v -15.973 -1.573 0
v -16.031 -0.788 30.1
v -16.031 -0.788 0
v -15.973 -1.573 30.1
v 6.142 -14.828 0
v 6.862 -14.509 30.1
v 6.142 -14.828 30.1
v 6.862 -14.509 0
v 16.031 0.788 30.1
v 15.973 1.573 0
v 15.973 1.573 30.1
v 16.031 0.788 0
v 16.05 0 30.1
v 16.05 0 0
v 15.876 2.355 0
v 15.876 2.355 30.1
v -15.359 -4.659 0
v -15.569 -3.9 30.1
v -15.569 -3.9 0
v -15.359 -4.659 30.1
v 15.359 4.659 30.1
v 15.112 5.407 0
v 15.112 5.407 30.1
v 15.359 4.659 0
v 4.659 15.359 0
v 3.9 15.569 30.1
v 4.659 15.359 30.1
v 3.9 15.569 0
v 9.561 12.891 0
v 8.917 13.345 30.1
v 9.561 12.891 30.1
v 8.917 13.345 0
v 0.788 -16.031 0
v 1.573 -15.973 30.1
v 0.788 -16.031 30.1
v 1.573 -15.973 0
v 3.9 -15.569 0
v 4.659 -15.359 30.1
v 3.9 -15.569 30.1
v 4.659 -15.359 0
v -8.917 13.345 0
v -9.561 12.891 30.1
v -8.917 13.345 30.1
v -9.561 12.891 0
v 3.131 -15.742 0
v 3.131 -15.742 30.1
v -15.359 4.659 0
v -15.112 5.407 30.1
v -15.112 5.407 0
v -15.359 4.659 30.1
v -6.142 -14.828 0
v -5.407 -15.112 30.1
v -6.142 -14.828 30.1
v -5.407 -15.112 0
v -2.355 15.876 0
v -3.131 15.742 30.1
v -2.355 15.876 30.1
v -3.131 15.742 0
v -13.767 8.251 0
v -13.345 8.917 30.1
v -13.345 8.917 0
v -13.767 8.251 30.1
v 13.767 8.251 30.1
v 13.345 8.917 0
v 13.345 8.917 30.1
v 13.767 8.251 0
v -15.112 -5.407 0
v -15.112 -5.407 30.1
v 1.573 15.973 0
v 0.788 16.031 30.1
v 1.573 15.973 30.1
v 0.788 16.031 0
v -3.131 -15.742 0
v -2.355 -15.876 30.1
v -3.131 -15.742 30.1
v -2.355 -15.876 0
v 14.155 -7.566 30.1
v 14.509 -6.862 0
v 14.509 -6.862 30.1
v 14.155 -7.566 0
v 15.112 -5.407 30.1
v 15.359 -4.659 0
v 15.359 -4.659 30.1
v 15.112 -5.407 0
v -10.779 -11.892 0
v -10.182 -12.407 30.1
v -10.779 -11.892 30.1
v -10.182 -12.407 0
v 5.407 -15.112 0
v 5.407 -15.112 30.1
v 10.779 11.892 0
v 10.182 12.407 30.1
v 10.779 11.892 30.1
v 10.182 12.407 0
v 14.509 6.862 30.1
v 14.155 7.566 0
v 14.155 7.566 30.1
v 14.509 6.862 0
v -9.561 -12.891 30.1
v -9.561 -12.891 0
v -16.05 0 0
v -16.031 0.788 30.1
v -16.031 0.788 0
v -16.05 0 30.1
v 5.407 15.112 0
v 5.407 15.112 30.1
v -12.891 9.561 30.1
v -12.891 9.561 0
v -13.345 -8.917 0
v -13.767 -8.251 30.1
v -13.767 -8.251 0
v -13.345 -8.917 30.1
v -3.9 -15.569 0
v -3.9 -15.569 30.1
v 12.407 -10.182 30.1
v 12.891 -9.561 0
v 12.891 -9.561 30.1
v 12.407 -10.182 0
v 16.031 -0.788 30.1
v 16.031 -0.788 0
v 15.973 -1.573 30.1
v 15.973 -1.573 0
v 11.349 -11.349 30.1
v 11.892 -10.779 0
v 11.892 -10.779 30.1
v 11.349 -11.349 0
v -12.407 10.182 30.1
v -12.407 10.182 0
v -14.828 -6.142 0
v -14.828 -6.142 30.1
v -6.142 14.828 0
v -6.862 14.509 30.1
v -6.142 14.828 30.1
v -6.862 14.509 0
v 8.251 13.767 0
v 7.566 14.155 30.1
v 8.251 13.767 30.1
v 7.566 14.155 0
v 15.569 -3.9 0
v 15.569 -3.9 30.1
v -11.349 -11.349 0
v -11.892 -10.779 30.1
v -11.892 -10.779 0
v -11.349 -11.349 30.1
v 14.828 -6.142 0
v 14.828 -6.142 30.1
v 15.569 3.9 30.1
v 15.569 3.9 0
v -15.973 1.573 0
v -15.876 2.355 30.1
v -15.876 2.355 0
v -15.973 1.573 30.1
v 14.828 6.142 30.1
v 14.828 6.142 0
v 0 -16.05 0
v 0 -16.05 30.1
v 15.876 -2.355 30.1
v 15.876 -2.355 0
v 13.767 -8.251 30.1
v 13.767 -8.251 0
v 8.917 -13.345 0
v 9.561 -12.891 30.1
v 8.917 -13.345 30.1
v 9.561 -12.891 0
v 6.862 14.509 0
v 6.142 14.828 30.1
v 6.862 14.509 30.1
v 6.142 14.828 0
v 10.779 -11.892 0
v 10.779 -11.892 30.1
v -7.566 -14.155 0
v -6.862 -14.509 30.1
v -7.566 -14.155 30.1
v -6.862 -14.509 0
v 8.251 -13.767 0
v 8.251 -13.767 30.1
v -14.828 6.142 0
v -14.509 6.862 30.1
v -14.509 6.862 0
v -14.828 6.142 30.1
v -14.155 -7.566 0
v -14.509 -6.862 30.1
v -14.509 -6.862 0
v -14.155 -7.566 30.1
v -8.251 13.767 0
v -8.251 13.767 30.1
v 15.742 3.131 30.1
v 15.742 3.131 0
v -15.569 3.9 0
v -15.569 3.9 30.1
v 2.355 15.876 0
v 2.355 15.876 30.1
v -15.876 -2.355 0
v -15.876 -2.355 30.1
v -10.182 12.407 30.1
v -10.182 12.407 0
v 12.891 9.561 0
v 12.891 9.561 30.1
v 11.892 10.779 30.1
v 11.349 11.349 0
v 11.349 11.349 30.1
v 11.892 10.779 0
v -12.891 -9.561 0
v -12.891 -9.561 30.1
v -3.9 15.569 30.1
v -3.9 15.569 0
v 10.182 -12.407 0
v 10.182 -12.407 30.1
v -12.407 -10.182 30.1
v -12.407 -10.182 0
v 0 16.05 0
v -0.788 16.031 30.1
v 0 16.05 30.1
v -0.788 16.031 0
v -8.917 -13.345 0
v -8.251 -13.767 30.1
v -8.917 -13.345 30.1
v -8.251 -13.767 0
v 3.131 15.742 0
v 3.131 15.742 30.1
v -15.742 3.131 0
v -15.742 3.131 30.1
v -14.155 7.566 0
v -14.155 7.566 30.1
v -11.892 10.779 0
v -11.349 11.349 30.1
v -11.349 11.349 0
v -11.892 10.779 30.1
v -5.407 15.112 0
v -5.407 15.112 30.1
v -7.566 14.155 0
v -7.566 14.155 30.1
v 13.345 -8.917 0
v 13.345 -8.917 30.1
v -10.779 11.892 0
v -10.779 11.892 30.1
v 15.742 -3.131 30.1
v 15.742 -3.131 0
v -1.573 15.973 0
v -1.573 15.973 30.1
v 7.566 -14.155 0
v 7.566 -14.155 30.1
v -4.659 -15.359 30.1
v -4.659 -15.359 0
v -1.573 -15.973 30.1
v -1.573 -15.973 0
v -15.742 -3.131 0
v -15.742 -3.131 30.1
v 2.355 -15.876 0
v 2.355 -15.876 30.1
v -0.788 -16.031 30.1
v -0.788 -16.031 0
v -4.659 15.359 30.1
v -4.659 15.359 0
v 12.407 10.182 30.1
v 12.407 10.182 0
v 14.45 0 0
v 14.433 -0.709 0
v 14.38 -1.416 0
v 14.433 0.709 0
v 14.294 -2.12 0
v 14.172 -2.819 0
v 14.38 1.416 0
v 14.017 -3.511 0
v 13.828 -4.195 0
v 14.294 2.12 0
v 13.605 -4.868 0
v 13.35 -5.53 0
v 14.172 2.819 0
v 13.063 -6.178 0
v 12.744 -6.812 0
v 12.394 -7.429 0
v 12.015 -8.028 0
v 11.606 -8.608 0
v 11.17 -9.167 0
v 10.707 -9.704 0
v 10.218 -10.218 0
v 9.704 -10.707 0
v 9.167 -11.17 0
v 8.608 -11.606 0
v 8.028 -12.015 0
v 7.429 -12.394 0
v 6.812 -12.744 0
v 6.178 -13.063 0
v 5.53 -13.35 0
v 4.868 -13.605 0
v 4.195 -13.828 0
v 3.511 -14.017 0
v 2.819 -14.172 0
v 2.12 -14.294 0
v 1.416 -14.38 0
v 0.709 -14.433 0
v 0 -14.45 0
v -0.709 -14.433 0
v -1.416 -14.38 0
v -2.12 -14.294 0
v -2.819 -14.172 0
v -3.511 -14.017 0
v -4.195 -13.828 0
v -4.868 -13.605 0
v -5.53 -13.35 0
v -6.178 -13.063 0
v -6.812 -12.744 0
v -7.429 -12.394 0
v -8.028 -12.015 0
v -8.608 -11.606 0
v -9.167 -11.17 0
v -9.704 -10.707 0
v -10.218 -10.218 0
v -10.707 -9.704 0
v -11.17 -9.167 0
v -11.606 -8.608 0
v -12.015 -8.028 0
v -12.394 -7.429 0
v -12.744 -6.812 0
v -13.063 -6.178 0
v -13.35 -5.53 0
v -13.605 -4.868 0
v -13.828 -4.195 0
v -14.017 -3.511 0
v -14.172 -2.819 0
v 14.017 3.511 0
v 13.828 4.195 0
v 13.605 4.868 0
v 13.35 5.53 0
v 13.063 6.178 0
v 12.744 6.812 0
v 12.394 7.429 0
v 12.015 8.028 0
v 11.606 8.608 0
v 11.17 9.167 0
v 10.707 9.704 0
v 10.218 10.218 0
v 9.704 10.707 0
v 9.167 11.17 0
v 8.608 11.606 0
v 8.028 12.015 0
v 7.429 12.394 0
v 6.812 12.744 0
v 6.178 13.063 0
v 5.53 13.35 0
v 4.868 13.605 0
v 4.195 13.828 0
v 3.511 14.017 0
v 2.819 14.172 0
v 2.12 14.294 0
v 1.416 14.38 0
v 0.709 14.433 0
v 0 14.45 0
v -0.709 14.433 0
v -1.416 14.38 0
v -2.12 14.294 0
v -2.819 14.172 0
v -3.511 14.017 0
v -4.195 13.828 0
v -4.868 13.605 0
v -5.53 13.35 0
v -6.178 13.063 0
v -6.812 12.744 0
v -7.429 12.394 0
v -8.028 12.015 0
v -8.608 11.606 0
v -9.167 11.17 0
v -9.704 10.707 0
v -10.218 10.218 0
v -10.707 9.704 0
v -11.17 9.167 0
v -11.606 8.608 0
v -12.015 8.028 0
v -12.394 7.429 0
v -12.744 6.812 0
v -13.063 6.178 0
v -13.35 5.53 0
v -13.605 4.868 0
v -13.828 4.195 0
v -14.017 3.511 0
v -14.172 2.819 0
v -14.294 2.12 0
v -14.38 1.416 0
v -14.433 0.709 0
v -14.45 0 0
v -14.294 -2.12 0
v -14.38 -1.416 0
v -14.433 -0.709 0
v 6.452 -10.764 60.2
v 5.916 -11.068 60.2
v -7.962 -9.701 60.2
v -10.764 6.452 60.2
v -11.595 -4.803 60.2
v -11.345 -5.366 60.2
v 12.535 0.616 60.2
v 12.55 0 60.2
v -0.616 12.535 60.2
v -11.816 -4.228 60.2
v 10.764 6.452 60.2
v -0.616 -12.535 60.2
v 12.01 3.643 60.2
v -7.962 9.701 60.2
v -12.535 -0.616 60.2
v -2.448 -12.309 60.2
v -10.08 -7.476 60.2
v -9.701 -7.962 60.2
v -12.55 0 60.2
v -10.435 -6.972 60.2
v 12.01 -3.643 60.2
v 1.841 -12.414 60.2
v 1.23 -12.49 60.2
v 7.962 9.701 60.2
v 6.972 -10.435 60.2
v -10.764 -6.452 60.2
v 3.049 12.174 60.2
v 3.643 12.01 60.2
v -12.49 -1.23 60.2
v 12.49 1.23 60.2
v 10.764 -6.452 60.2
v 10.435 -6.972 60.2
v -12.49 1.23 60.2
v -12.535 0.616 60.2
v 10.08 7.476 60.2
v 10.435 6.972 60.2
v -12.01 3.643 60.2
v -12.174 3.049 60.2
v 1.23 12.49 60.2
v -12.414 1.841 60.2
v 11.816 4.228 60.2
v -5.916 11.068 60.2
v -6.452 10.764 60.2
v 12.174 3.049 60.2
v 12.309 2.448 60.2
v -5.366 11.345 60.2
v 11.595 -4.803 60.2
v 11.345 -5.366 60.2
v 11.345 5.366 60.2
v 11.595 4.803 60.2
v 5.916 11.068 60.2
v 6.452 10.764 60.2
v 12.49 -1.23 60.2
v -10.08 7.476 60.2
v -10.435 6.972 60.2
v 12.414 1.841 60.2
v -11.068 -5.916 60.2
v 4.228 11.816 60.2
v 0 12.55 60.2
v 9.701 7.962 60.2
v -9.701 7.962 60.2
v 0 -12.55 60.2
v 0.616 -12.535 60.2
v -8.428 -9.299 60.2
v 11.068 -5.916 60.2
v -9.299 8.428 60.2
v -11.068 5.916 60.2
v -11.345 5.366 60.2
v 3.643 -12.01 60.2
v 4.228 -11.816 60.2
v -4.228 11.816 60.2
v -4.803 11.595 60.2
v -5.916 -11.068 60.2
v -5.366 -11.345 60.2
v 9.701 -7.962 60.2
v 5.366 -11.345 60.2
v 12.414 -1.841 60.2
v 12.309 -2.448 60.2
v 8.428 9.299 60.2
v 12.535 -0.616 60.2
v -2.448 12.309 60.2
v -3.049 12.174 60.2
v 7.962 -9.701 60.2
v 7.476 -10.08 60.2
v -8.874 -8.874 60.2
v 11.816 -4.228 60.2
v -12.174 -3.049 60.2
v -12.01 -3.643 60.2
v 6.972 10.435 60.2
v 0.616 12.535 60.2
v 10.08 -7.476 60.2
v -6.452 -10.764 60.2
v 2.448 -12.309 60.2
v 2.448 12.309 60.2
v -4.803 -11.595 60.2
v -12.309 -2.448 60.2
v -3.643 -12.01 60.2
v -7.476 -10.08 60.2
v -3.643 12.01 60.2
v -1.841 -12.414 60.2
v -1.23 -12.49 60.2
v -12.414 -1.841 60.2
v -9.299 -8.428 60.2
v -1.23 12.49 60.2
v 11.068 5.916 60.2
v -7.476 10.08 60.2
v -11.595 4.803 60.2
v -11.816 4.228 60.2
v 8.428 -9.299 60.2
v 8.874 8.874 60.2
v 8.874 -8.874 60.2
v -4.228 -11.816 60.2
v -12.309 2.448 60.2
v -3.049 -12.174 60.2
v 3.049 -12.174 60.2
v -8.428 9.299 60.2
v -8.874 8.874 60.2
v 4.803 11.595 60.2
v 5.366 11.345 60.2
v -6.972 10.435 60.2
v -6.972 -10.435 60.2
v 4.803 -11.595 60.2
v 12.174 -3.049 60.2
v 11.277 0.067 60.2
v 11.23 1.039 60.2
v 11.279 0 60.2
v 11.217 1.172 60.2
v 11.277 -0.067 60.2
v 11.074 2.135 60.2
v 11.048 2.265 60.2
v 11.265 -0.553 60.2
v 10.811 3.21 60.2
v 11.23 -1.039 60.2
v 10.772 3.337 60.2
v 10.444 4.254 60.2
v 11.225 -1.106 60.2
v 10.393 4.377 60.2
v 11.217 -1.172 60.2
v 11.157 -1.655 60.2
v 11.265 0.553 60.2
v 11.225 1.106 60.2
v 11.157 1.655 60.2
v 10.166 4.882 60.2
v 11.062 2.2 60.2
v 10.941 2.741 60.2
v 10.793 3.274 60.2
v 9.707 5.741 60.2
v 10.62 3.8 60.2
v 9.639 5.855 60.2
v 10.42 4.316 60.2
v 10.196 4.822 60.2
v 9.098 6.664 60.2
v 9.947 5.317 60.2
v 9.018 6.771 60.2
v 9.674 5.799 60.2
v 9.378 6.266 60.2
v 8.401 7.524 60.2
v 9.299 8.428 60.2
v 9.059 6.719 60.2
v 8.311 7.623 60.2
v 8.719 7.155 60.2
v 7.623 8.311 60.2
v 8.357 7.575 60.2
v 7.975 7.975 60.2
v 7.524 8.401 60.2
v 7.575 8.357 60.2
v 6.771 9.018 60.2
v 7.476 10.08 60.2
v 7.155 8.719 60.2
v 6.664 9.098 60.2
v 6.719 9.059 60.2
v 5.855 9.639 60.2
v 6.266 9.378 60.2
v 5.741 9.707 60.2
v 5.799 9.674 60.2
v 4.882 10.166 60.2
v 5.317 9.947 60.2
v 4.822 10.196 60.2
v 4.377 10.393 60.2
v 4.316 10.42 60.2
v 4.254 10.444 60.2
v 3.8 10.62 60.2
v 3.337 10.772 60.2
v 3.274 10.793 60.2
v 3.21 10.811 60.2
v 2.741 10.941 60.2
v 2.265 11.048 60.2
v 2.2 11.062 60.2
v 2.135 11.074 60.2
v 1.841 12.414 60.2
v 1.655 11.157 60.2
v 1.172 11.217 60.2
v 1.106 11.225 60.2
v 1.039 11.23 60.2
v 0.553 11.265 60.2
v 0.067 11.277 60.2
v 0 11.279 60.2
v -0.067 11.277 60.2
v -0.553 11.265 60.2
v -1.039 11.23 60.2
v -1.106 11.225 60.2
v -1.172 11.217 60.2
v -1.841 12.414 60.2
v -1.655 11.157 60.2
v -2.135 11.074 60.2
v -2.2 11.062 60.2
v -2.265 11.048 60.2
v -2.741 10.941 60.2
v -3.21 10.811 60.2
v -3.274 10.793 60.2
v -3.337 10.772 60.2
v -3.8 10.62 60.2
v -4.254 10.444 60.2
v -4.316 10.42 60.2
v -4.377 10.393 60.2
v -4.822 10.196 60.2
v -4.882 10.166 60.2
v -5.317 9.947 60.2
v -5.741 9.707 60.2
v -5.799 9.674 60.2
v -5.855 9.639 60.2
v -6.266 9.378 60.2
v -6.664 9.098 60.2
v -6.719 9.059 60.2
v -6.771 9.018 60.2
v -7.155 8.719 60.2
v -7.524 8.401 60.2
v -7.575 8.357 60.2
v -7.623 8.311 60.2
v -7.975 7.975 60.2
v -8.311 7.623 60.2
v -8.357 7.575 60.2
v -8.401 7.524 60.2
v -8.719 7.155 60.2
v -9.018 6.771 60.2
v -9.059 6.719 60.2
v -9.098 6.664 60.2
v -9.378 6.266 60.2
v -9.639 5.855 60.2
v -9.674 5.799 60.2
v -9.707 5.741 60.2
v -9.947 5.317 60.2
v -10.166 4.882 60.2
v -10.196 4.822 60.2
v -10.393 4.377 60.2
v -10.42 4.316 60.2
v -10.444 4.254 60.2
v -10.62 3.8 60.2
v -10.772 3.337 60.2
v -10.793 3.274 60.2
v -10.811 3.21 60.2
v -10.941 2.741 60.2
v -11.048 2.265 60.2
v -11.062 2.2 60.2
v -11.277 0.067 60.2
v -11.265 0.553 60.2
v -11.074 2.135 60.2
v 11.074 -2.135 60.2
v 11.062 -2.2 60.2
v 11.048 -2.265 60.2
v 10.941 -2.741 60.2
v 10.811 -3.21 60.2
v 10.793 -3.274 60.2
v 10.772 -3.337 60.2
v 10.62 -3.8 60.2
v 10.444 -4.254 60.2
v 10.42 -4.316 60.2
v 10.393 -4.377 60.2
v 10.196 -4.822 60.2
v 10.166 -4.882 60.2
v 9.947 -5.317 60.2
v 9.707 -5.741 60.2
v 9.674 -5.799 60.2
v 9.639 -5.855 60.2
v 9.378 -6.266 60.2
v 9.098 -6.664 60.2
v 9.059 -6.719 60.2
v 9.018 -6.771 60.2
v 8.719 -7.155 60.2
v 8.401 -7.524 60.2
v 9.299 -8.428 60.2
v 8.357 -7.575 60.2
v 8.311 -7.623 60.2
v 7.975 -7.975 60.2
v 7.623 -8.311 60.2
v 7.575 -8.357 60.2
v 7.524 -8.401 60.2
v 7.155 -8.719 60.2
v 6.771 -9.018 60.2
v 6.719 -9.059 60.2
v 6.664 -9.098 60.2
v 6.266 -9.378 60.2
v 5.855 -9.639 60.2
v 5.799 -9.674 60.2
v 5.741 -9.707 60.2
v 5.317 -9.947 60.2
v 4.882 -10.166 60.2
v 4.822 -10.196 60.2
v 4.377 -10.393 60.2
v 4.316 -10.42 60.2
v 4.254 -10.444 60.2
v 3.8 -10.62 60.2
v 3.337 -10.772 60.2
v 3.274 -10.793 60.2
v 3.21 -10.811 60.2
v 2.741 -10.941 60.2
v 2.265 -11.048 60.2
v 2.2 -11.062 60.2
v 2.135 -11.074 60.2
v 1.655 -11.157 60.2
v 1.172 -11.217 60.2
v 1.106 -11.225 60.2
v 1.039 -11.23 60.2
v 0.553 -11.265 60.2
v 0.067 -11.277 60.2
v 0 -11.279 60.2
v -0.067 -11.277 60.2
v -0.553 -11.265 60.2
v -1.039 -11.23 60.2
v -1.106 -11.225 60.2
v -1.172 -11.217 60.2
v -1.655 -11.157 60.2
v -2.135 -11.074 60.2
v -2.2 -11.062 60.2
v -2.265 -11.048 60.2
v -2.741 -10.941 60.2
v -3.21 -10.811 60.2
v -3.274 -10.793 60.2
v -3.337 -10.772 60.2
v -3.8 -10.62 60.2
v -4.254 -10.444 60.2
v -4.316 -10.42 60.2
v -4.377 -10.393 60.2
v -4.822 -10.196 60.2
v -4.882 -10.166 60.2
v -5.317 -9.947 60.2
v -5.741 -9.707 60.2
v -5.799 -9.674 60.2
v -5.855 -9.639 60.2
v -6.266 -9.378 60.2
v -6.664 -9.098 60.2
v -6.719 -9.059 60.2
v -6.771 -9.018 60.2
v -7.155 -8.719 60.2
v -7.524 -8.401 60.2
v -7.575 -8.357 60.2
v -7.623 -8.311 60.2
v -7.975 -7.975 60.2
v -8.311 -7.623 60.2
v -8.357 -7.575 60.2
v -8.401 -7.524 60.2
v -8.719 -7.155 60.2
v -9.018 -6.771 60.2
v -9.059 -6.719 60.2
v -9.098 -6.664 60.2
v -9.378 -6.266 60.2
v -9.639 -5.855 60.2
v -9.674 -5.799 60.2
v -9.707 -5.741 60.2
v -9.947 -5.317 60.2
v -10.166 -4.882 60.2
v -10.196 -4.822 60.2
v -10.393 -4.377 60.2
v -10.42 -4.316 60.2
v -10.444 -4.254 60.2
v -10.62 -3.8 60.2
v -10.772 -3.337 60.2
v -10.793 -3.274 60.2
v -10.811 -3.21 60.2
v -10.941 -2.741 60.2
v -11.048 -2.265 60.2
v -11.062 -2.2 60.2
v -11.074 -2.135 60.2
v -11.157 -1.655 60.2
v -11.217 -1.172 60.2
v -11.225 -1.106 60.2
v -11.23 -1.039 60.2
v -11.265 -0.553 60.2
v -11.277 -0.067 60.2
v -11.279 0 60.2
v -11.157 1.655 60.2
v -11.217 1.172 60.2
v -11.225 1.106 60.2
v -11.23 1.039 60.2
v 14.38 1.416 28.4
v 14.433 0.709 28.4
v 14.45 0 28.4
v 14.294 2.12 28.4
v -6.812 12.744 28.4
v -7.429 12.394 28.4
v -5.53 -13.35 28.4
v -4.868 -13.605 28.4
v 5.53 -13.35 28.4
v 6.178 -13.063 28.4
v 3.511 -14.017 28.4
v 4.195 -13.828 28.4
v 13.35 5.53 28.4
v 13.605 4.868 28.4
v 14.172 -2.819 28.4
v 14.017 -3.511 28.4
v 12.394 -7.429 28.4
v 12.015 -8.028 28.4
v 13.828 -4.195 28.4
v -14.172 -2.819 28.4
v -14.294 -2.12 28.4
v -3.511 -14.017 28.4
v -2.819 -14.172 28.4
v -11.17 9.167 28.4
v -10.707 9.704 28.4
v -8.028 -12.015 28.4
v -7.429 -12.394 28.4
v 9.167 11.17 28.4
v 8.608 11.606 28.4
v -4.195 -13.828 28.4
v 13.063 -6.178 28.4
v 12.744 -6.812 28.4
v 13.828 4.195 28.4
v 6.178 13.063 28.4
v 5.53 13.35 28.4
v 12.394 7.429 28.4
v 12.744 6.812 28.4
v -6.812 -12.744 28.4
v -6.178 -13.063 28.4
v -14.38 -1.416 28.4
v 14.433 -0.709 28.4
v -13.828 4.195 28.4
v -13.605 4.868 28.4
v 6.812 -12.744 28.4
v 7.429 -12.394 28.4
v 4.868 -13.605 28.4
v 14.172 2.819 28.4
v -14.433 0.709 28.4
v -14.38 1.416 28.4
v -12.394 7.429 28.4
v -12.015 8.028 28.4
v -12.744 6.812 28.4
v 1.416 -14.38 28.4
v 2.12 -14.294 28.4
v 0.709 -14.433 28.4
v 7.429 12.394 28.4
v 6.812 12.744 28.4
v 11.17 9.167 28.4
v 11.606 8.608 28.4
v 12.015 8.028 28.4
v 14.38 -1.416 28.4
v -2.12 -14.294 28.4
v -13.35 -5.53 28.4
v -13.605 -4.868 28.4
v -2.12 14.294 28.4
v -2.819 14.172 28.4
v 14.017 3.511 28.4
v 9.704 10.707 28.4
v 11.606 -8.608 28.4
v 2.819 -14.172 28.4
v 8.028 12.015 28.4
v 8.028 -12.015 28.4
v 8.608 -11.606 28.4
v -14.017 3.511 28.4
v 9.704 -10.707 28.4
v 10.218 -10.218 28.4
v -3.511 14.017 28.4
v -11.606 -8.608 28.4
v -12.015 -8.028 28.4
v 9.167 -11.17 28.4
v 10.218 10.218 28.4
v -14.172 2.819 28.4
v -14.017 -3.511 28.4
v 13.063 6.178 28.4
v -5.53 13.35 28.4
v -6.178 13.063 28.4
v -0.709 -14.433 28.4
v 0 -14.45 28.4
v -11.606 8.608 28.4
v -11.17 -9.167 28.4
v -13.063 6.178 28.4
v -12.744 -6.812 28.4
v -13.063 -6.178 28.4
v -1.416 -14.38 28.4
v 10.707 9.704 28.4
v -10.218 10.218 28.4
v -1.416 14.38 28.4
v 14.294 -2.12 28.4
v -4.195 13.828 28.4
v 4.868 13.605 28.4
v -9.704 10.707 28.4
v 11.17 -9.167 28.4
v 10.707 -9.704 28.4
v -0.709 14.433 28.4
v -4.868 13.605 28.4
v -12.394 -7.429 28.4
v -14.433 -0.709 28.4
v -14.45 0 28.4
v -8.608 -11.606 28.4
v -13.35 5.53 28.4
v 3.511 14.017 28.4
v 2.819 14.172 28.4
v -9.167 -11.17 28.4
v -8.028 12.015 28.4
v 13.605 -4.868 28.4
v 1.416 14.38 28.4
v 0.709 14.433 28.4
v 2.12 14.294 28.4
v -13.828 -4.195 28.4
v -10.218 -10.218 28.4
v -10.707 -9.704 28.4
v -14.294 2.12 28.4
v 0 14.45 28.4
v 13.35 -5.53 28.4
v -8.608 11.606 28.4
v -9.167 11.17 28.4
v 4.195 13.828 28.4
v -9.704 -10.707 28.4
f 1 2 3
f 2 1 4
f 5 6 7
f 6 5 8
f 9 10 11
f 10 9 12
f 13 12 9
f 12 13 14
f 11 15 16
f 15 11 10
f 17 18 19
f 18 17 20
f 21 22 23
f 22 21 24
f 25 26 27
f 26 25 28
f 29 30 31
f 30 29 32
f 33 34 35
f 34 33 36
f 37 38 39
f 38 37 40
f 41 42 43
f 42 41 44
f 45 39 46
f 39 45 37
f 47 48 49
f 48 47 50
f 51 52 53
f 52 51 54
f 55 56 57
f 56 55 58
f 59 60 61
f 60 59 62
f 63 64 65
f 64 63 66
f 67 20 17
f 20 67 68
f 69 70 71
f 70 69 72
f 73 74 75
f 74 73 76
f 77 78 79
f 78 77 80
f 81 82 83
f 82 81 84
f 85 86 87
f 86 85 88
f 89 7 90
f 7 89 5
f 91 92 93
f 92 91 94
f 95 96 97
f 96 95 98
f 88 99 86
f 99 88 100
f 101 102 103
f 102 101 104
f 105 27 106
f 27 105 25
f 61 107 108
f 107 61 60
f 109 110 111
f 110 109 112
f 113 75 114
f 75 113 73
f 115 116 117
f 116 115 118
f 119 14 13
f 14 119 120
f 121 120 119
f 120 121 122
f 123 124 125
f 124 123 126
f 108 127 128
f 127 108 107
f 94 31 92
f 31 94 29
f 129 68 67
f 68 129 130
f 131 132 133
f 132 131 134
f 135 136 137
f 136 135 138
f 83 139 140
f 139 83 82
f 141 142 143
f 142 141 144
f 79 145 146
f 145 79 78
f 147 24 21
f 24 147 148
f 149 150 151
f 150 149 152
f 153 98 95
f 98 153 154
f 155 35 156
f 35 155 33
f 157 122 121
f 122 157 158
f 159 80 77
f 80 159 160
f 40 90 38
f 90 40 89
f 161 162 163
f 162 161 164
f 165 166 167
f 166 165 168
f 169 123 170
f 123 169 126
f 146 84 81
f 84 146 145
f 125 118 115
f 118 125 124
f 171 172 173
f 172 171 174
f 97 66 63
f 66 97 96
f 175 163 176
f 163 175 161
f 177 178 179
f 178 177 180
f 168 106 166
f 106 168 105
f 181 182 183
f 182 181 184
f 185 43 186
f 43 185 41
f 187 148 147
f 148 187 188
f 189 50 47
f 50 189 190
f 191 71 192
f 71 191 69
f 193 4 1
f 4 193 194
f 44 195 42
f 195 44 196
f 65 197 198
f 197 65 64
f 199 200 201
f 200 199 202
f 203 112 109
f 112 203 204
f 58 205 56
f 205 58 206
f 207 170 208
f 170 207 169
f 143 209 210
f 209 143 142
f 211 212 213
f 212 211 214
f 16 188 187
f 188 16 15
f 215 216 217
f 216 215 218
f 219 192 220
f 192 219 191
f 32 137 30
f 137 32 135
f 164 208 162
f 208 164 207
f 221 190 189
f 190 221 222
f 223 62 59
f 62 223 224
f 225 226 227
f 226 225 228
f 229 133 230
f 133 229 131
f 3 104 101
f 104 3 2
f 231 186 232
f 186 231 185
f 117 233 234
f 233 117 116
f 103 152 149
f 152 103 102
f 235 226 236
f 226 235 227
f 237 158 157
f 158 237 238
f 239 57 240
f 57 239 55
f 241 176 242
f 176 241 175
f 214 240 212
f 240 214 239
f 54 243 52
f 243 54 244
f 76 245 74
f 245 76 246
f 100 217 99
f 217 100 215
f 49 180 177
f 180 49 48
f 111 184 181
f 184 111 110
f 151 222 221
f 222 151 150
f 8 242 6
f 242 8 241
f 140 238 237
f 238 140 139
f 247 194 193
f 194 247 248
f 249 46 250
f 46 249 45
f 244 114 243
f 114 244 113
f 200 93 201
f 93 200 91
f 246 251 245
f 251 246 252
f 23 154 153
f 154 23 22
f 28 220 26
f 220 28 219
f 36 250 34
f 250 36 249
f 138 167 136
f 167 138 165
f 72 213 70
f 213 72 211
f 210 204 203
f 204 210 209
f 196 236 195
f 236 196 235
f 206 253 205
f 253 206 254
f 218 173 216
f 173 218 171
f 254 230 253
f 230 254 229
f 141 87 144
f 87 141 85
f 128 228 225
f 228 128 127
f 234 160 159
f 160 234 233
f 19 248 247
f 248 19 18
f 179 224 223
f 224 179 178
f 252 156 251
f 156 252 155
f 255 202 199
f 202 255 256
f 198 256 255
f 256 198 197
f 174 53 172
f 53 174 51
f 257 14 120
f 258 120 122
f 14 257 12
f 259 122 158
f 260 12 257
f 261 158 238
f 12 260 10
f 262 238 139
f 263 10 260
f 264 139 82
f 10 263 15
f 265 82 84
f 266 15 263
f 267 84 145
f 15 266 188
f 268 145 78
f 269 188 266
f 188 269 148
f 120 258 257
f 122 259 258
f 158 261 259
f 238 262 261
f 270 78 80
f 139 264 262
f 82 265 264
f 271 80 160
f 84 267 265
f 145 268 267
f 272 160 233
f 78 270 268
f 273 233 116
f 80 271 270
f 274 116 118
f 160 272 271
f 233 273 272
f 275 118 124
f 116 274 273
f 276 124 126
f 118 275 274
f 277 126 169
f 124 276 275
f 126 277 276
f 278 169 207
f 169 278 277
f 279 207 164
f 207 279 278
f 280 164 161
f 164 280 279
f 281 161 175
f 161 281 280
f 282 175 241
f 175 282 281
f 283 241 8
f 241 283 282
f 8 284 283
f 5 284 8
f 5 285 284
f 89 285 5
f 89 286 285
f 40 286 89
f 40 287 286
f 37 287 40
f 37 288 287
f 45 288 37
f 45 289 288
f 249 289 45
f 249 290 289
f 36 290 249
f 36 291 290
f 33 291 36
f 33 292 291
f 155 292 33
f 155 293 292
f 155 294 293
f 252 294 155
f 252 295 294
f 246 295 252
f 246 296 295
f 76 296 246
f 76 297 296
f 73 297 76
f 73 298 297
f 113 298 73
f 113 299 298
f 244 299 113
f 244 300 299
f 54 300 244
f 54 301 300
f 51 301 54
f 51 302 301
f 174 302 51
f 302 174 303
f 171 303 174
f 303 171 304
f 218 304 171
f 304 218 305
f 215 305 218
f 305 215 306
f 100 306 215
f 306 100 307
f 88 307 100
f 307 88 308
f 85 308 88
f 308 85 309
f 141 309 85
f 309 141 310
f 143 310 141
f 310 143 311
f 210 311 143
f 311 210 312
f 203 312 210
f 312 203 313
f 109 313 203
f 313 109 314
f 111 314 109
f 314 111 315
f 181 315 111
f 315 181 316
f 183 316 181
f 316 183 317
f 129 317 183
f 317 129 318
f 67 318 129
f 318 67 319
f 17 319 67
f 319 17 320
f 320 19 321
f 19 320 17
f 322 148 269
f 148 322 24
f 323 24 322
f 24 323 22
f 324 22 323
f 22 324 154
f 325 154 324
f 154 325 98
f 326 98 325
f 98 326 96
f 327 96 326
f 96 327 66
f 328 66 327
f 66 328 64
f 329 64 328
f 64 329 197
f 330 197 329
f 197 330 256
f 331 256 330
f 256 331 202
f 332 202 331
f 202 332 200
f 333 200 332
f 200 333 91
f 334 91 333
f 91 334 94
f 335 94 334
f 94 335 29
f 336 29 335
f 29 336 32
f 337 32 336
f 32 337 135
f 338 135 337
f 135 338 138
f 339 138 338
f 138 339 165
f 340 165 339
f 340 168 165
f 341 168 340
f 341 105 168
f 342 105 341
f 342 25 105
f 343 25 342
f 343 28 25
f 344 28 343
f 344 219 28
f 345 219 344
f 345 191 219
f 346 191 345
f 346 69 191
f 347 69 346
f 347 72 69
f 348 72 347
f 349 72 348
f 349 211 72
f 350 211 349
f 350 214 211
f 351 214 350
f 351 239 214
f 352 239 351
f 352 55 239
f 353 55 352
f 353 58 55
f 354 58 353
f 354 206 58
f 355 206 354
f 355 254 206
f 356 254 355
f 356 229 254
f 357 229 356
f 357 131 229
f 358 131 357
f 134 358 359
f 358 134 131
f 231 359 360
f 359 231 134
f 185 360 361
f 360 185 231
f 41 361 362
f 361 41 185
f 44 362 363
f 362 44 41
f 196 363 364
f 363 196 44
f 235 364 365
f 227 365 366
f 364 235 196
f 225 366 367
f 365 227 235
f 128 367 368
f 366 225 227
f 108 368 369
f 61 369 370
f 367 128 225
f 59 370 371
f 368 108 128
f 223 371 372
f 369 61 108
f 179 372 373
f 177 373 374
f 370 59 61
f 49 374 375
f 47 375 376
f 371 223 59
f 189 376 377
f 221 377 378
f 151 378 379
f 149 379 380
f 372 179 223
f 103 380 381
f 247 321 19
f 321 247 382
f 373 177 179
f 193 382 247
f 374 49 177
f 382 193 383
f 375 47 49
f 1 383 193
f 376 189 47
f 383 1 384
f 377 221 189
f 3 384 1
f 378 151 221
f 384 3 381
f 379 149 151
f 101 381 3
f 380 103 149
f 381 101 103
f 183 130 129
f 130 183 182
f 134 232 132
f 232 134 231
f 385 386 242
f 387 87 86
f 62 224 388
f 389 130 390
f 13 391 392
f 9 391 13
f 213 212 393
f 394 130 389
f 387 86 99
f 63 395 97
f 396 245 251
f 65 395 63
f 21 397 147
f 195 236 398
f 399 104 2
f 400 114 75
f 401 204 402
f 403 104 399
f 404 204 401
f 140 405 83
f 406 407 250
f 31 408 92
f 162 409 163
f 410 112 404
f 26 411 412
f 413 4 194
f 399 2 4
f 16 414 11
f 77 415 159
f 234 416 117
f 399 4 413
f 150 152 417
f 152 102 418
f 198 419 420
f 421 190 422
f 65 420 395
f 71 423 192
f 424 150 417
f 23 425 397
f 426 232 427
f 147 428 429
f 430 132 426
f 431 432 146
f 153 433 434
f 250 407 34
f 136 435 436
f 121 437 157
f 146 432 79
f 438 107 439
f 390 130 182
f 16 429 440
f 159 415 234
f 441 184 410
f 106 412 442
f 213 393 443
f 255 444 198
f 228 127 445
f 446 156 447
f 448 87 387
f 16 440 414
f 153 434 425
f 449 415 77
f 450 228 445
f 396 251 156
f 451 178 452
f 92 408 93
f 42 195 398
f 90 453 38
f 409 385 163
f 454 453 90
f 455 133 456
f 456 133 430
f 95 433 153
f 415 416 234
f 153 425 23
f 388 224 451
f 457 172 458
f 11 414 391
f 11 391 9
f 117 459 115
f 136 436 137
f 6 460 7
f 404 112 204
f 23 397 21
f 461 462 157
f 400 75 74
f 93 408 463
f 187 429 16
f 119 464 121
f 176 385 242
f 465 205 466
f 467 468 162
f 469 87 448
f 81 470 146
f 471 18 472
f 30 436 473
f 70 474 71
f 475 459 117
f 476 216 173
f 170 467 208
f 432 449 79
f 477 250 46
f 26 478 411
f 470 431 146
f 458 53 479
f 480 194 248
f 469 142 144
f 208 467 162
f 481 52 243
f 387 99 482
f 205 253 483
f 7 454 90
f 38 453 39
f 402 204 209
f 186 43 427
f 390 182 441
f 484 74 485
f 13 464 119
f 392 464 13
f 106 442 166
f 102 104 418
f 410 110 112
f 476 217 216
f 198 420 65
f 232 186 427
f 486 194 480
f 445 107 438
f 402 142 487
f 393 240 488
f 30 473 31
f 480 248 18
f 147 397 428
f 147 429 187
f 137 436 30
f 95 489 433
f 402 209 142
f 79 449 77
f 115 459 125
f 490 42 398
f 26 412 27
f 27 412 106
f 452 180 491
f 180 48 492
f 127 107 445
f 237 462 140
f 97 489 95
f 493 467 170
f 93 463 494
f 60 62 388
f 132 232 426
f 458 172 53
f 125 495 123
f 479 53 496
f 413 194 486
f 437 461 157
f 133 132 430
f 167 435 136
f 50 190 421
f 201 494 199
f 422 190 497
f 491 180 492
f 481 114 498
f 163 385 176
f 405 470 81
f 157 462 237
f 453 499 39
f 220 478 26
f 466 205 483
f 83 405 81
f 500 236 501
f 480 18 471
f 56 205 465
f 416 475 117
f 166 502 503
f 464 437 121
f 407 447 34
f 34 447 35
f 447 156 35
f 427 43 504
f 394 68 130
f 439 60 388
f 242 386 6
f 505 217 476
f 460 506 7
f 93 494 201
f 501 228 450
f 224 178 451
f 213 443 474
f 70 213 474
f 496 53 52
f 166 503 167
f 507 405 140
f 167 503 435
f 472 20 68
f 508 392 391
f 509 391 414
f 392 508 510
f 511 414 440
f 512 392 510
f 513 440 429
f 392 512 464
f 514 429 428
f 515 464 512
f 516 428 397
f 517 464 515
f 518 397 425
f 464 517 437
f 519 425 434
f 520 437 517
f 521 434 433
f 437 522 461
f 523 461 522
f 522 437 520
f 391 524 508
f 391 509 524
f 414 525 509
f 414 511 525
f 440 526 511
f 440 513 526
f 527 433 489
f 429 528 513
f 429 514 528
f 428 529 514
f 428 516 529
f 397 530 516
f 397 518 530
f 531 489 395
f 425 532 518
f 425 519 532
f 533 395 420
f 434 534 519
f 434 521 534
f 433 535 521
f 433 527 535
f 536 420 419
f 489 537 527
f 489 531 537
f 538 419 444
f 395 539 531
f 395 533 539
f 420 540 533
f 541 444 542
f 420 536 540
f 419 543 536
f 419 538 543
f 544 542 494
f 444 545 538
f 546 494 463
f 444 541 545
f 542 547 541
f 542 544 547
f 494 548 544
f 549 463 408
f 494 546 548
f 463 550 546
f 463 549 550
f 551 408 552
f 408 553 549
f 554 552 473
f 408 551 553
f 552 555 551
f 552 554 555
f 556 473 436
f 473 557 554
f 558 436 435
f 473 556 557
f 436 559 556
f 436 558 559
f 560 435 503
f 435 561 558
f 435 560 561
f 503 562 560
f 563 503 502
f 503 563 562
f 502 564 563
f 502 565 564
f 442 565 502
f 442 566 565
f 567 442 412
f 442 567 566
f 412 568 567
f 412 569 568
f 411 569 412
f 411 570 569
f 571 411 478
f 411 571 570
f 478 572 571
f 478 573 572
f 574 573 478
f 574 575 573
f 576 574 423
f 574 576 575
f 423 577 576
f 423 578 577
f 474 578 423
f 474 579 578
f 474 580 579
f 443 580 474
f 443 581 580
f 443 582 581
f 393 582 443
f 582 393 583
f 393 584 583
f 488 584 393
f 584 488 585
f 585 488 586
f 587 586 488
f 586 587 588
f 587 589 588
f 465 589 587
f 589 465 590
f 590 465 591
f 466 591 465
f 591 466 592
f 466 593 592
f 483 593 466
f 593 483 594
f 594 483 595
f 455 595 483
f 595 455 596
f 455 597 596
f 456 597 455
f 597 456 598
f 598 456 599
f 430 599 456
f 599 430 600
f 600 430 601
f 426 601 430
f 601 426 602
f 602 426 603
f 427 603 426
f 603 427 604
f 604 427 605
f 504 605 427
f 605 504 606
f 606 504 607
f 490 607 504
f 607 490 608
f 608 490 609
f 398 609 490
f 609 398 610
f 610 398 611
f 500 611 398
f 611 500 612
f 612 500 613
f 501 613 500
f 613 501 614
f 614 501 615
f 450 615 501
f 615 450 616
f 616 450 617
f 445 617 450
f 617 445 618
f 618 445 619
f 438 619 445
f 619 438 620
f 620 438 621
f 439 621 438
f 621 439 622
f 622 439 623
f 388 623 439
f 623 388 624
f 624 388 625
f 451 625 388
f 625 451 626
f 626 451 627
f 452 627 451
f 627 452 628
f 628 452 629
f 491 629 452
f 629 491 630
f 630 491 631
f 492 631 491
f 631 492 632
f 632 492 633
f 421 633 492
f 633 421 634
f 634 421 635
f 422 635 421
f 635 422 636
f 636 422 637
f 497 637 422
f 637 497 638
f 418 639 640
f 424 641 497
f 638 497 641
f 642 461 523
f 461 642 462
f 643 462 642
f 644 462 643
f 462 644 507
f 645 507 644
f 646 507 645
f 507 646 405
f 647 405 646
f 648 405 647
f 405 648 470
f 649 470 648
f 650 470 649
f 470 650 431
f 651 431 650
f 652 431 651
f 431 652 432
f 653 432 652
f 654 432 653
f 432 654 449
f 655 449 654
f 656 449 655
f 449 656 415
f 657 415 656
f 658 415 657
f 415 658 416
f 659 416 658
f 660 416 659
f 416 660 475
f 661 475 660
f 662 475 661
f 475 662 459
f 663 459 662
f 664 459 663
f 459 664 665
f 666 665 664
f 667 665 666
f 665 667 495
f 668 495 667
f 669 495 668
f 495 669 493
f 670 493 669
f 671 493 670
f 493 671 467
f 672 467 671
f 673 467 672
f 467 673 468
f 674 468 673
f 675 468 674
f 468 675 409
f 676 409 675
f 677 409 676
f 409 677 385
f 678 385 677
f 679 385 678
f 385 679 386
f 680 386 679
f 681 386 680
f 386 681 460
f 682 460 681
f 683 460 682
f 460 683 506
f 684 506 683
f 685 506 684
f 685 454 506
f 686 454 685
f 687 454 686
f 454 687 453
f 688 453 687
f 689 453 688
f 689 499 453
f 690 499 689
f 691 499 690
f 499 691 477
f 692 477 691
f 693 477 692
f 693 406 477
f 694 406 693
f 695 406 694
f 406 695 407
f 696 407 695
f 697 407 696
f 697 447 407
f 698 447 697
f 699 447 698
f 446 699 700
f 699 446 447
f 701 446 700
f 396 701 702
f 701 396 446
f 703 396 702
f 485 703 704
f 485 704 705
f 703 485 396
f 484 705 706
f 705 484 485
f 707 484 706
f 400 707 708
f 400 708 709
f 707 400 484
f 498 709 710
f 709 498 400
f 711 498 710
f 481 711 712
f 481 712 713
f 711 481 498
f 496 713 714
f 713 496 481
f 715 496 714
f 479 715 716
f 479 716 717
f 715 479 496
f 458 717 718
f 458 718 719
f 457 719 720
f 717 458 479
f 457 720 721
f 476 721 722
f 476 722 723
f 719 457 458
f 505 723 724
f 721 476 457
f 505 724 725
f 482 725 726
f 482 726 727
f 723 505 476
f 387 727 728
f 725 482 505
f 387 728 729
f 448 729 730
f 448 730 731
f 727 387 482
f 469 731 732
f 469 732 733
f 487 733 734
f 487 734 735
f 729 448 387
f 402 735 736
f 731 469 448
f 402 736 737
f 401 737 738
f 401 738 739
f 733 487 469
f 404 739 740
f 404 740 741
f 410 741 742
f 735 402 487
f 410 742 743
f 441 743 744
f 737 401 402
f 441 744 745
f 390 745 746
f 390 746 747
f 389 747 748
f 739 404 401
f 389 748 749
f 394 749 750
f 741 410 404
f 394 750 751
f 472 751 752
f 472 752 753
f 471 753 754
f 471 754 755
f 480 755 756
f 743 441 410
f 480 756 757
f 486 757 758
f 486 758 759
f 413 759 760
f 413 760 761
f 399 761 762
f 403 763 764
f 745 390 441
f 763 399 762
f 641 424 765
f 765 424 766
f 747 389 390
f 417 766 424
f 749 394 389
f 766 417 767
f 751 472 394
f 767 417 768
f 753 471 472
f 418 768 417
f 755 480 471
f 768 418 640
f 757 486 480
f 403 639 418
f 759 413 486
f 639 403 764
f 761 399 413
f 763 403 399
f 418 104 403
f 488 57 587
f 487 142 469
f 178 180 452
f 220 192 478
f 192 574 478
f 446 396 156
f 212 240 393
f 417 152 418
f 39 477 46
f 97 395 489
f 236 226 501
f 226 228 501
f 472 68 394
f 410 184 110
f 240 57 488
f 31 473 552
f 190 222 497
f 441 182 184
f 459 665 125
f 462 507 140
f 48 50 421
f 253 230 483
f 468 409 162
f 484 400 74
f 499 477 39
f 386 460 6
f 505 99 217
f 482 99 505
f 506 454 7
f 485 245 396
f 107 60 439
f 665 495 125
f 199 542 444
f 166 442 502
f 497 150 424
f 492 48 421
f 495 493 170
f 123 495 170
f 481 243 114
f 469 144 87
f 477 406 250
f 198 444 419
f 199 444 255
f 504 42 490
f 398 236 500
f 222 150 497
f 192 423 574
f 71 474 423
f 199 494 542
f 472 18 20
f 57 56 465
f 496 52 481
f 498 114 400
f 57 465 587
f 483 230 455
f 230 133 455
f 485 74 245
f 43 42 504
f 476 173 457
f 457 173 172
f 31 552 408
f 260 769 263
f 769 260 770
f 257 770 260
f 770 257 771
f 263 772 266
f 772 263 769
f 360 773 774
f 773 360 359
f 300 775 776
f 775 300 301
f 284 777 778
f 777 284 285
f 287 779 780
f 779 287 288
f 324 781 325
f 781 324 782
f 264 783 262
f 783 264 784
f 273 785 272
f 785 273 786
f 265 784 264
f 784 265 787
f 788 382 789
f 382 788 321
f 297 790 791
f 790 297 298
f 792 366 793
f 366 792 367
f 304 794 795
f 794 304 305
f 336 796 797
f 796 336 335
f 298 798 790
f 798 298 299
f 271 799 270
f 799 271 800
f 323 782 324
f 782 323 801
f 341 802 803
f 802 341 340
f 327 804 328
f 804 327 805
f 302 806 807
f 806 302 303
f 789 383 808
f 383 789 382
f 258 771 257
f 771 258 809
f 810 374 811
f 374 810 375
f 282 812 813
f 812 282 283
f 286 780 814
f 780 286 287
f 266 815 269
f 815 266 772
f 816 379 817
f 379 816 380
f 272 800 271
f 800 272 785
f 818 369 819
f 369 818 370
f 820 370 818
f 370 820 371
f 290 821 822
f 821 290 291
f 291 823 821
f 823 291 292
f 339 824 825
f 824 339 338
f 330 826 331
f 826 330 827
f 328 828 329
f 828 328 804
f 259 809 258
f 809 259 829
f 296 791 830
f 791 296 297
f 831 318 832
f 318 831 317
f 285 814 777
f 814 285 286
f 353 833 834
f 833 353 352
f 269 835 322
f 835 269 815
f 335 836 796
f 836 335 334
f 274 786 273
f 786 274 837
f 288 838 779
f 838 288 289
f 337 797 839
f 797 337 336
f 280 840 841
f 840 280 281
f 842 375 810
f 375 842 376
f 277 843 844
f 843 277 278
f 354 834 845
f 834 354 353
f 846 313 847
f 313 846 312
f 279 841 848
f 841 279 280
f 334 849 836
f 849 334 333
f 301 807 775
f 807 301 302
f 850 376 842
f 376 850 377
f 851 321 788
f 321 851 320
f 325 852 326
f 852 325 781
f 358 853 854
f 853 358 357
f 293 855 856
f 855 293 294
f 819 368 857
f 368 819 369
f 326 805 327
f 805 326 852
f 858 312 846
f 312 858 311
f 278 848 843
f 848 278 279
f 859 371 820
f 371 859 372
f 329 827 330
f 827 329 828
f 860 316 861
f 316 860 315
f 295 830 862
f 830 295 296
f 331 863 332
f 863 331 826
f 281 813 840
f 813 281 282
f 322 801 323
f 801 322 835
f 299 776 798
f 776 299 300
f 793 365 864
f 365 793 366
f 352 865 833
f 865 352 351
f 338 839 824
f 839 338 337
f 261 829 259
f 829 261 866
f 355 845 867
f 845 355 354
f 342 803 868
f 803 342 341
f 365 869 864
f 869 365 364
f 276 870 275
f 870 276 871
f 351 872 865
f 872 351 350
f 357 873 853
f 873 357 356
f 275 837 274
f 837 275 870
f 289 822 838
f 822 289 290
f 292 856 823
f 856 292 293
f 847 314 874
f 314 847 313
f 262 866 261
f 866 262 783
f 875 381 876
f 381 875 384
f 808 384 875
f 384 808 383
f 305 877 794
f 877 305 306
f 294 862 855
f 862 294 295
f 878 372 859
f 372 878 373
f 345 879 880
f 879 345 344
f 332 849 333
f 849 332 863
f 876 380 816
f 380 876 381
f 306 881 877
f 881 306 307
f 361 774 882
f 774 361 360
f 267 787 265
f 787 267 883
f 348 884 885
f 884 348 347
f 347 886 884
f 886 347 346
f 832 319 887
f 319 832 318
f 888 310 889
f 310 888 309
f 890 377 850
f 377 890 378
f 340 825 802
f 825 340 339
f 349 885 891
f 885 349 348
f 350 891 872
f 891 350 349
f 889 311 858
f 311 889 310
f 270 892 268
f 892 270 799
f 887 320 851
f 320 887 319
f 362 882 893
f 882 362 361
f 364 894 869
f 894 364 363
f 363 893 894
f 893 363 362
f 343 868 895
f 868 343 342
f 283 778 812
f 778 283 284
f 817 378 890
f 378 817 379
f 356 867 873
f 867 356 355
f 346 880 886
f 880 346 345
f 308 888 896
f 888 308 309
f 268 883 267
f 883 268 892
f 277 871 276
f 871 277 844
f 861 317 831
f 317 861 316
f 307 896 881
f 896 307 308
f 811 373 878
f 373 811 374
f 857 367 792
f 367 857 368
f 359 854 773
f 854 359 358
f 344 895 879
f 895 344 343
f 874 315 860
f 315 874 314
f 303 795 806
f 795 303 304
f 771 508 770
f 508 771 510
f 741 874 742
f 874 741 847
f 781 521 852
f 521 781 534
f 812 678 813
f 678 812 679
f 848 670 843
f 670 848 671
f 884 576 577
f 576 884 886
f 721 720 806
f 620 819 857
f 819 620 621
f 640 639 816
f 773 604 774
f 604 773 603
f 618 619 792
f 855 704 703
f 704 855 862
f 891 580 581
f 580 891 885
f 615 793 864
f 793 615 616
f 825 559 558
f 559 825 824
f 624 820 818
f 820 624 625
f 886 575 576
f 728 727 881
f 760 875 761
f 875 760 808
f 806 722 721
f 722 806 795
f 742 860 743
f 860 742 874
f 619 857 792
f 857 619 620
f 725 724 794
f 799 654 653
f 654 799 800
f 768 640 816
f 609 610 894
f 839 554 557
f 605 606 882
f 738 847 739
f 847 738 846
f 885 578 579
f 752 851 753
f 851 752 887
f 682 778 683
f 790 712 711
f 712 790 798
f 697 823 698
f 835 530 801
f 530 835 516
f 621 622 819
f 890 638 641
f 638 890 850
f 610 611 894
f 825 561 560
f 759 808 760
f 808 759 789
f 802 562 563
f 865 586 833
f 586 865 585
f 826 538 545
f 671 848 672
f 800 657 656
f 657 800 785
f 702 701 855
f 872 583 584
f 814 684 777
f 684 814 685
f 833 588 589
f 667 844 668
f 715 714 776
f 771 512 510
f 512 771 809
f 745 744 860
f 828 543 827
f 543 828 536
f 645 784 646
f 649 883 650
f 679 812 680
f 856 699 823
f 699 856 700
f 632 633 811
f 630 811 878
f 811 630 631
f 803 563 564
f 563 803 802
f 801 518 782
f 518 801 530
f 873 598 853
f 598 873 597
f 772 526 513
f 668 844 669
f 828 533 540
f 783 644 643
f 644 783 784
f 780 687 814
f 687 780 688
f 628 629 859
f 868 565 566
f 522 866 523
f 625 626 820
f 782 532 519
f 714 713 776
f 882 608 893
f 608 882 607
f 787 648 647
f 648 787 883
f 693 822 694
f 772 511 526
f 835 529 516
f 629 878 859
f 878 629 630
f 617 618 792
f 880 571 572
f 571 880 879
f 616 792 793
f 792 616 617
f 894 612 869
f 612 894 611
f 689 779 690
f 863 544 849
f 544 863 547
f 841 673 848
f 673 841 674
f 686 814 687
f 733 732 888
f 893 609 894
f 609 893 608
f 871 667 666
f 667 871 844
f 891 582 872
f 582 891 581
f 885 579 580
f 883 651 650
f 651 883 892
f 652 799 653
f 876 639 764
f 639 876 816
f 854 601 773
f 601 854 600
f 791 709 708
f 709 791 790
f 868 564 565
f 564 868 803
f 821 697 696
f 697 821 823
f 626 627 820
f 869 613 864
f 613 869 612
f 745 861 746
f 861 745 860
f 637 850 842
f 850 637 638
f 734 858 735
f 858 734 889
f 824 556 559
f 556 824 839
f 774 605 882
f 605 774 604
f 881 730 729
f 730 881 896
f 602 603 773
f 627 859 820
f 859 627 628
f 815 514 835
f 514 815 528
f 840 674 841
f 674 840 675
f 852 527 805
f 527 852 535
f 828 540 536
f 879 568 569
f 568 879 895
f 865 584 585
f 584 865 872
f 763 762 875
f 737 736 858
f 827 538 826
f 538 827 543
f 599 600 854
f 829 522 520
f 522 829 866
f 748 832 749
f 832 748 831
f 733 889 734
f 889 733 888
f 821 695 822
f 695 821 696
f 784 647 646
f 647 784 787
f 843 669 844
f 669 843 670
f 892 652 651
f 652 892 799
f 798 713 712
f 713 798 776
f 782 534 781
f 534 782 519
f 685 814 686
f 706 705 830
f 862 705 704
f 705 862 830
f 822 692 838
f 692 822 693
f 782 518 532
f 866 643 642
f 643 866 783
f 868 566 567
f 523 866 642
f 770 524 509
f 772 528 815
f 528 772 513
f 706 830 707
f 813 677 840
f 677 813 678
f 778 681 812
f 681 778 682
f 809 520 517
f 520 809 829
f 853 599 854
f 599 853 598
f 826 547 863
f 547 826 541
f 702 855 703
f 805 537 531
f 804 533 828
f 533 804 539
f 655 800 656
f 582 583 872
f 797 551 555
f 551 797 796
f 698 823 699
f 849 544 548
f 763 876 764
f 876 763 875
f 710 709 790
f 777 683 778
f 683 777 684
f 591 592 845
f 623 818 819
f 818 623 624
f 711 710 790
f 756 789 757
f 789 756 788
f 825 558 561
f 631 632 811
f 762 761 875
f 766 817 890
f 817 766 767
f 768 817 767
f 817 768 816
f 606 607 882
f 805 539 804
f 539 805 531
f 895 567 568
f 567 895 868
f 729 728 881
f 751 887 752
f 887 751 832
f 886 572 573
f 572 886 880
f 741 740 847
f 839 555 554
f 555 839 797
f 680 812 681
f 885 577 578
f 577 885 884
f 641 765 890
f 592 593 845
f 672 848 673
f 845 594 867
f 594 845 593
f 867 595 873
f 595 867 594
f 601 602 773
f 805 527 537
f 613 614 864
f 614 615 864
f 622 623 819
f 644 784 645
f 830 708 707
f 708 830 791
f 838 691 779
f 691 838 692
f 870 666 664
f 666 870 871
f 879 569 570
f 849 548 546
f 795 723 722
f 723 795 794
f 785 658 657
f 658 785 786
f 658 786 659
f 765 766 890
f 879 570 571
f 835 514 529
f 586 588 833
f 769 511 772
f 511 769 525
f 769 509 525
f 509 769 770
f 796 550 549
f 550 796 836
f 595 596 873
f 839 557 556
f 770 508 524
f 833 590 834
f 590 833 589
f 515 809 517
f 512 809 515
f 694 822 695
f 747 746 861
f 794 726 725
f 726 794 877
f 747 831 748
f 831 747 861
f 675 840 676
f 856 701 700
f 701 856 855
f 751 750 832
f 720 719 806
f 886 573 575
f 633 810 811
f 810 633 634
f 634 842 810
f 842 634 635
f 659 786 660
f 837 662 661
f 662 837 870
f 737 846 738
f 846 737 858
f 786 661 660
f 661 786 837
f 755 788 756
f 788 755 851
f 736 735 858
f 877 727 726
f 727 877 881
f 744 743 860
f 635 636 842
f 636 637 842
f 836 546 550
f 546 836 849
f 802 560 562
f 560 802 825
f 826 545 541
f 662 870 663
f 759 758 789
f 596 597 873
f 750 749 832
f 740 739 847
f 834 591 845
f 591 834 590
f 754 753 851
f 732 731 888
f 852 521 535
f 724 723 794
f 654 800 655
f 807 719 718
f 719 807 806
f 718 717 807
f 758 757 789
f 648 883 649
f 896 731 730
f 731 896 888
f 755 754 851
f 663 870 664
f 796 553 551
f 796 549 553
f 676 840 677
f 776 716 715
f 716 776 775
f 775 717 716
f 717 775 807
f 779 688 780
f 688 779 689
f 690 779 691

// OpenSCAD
// Developer: Atrox3D (Kevin Müller)
// Parametrische Staubsauger-Aufsätze
// Skalierung / Auflösung
$fn = $preview ? 64 : 128;

/* [Aufsatztyp] */
// Moegliche Werte: "adapter", "fugen_duese", "flach_duese", "buerste"
aufsatz_typ = "fugen_duese";

/* =================== Globale Parameter =================== */

/* [adapter] */
adapter_inlet_start_diameter = 32.1;
adapter_outled_end_diameter  = 25.1;
adapter_start_length         = 30.1;
adapter_end_length           = 30.1;
adapter_wall_thickness       = 1.6;

/* [fugen_duese] */
fugenD_inlet_start_diameter  = 32.1;
fugenD_outled_end_diameter   = 25.1;
fugenD_start_length          = 30.1;
fugenD_end_length            = 30.1;
fugenD_wall_thickness        = 1.6;
fugenD_end_angle             = 0.0;

/* [flach_duese] */
durchmesser_innen0 = 30.0;
laenge1 = 20.0;
laenge2 = 30.0;
wandstaerke = 1.6;
breite = 20.0;
laenge3 = 50.0;
winkel = 15.0;

/* [buerste] */
durchmesser_innen = 30.0;
laenge = 25.0;

/* =================== Dispatcher =================== */
if (aufsatz_typ == "adapter")
    adapter(adapter_inlet_start_diameter, adapter_outled_end_diameter, adapter_start_length, adapter_end_length, adapter_wall_thickness);

else if (aufsatz_typ == "fugen_duese")
    fugen_duese(fugenD_inlet_start_diameter, fugenD_start_length, fugenD_outled_end_diameter, fugenD_end_length, fugenD_wall_thickness, fugenD_end_angle);

else if (aufsatz_typ == "flach_duese")
    flach_duese(durchmesser_innen0, laenge1, laenge2, wandstaerke, breite, laenge3, winkel);

else if (aufsatz_typ == "buerste")
    buerste(durchmesser_innen, laenge, wandstaerke);

/* =================== Vormodule =================== */
module adapter_base(d_in_s, d_out_e, l_s, l_e, w){
    // Außenkörper
    union(){
        cylinder(h=l_s, d=d_in_s);
        translate([0,0,l_s-0.01]) cylinder(h=d_in_s-d_out_e, d1=d_in_s, d2=d_out_e);
        translate([0,0,l_s-0.1]) cylinder(h=l_e+0.1, d=d_out_e);
    }
}

/* =================== Endmodule =================== */
module adapter(d_in_s, d_out_e, l_s, l_e, w){
    difference(){
        adapter_base(d_in_s+2*w, d_out_e, l_s, l_e, w);
        translate([0,0,-0.1-w]) adapter_base(d_in_s, d_out_e-2*w, l_s, l_e+20, w);
    }
}

module fugen_duese(d_in_s, l_s, d_out_e, l_e, w, e_a){
    difference(){
        union(){
            cylinder(h=l_s, d=d_in_s);
            translate([0,0,l_s]) cylinder(d1=d_in_s, d2=d_out_e, h=l_e);
        }
        // Abschrägung über Rotationsschnitt
        translate([0,0,l_s+l_e+10]) rotate([0,e_a,0]) cube([50,50,20], center=true);
        // Bohrung innen
        translate([0,0,-0.1-w]) union(){
            cylinder(h=l_s, d=d_in_s-2*w);
            translate([0,0,l_s]) cylinder(d1=d_in_s-2*w, d2=d_out_e-2*w, h=l_e+5);
        }
    }
}

/* Simple Grundform für Flachdüse (Platzhalter, parametrisierbar) */
module flach_duese(d_in, l1, l2, w, b, l3, ang){
    difference(){
        union(){
            // Rund auf flach Übergang
            cylinder(h=l1, d=d_in+2*w);
            translate([0,0,l1]) hull(){
                circle(d=d_in+2*w);
                translate([b/2,0,0]) square([b, w*2], center=true);
            }
            translate([0,0,l1]) rotate([ang,0,0]) cube([b+2*w, (w*2)+10, l3], center=false);
        }
        // Innenkanal
        translate([0,0,-0.1-w]) union(){
            cylinder(h=l1+0.2, d=d_in);
            translate([0,0,l1]) hull(){
                circle(d=d_in);
                translate([b/2,0,0]) square([b, w], center=true);
            }
            translate([0,0,l1]) rotate([ang,0,0]) cube([b, w, l3+2], center=false);
        }
    }
}

/* Einfache Bürste als Grundkörper (ohne Borsten) */
module buerste(d_in, l, w){
    difference(){
        // Außenkörper
        union(){
            cylinder(h=l, d=d_in+2*w);
            translate([0,0,l]) cylinder(h=w*3, d=d_in+2*w+6);
        }
        // Innenbohrung
        translate([0,0,-0.1]) cylinder(h=l+w*3+0.2, d=d_in);
    }
}
